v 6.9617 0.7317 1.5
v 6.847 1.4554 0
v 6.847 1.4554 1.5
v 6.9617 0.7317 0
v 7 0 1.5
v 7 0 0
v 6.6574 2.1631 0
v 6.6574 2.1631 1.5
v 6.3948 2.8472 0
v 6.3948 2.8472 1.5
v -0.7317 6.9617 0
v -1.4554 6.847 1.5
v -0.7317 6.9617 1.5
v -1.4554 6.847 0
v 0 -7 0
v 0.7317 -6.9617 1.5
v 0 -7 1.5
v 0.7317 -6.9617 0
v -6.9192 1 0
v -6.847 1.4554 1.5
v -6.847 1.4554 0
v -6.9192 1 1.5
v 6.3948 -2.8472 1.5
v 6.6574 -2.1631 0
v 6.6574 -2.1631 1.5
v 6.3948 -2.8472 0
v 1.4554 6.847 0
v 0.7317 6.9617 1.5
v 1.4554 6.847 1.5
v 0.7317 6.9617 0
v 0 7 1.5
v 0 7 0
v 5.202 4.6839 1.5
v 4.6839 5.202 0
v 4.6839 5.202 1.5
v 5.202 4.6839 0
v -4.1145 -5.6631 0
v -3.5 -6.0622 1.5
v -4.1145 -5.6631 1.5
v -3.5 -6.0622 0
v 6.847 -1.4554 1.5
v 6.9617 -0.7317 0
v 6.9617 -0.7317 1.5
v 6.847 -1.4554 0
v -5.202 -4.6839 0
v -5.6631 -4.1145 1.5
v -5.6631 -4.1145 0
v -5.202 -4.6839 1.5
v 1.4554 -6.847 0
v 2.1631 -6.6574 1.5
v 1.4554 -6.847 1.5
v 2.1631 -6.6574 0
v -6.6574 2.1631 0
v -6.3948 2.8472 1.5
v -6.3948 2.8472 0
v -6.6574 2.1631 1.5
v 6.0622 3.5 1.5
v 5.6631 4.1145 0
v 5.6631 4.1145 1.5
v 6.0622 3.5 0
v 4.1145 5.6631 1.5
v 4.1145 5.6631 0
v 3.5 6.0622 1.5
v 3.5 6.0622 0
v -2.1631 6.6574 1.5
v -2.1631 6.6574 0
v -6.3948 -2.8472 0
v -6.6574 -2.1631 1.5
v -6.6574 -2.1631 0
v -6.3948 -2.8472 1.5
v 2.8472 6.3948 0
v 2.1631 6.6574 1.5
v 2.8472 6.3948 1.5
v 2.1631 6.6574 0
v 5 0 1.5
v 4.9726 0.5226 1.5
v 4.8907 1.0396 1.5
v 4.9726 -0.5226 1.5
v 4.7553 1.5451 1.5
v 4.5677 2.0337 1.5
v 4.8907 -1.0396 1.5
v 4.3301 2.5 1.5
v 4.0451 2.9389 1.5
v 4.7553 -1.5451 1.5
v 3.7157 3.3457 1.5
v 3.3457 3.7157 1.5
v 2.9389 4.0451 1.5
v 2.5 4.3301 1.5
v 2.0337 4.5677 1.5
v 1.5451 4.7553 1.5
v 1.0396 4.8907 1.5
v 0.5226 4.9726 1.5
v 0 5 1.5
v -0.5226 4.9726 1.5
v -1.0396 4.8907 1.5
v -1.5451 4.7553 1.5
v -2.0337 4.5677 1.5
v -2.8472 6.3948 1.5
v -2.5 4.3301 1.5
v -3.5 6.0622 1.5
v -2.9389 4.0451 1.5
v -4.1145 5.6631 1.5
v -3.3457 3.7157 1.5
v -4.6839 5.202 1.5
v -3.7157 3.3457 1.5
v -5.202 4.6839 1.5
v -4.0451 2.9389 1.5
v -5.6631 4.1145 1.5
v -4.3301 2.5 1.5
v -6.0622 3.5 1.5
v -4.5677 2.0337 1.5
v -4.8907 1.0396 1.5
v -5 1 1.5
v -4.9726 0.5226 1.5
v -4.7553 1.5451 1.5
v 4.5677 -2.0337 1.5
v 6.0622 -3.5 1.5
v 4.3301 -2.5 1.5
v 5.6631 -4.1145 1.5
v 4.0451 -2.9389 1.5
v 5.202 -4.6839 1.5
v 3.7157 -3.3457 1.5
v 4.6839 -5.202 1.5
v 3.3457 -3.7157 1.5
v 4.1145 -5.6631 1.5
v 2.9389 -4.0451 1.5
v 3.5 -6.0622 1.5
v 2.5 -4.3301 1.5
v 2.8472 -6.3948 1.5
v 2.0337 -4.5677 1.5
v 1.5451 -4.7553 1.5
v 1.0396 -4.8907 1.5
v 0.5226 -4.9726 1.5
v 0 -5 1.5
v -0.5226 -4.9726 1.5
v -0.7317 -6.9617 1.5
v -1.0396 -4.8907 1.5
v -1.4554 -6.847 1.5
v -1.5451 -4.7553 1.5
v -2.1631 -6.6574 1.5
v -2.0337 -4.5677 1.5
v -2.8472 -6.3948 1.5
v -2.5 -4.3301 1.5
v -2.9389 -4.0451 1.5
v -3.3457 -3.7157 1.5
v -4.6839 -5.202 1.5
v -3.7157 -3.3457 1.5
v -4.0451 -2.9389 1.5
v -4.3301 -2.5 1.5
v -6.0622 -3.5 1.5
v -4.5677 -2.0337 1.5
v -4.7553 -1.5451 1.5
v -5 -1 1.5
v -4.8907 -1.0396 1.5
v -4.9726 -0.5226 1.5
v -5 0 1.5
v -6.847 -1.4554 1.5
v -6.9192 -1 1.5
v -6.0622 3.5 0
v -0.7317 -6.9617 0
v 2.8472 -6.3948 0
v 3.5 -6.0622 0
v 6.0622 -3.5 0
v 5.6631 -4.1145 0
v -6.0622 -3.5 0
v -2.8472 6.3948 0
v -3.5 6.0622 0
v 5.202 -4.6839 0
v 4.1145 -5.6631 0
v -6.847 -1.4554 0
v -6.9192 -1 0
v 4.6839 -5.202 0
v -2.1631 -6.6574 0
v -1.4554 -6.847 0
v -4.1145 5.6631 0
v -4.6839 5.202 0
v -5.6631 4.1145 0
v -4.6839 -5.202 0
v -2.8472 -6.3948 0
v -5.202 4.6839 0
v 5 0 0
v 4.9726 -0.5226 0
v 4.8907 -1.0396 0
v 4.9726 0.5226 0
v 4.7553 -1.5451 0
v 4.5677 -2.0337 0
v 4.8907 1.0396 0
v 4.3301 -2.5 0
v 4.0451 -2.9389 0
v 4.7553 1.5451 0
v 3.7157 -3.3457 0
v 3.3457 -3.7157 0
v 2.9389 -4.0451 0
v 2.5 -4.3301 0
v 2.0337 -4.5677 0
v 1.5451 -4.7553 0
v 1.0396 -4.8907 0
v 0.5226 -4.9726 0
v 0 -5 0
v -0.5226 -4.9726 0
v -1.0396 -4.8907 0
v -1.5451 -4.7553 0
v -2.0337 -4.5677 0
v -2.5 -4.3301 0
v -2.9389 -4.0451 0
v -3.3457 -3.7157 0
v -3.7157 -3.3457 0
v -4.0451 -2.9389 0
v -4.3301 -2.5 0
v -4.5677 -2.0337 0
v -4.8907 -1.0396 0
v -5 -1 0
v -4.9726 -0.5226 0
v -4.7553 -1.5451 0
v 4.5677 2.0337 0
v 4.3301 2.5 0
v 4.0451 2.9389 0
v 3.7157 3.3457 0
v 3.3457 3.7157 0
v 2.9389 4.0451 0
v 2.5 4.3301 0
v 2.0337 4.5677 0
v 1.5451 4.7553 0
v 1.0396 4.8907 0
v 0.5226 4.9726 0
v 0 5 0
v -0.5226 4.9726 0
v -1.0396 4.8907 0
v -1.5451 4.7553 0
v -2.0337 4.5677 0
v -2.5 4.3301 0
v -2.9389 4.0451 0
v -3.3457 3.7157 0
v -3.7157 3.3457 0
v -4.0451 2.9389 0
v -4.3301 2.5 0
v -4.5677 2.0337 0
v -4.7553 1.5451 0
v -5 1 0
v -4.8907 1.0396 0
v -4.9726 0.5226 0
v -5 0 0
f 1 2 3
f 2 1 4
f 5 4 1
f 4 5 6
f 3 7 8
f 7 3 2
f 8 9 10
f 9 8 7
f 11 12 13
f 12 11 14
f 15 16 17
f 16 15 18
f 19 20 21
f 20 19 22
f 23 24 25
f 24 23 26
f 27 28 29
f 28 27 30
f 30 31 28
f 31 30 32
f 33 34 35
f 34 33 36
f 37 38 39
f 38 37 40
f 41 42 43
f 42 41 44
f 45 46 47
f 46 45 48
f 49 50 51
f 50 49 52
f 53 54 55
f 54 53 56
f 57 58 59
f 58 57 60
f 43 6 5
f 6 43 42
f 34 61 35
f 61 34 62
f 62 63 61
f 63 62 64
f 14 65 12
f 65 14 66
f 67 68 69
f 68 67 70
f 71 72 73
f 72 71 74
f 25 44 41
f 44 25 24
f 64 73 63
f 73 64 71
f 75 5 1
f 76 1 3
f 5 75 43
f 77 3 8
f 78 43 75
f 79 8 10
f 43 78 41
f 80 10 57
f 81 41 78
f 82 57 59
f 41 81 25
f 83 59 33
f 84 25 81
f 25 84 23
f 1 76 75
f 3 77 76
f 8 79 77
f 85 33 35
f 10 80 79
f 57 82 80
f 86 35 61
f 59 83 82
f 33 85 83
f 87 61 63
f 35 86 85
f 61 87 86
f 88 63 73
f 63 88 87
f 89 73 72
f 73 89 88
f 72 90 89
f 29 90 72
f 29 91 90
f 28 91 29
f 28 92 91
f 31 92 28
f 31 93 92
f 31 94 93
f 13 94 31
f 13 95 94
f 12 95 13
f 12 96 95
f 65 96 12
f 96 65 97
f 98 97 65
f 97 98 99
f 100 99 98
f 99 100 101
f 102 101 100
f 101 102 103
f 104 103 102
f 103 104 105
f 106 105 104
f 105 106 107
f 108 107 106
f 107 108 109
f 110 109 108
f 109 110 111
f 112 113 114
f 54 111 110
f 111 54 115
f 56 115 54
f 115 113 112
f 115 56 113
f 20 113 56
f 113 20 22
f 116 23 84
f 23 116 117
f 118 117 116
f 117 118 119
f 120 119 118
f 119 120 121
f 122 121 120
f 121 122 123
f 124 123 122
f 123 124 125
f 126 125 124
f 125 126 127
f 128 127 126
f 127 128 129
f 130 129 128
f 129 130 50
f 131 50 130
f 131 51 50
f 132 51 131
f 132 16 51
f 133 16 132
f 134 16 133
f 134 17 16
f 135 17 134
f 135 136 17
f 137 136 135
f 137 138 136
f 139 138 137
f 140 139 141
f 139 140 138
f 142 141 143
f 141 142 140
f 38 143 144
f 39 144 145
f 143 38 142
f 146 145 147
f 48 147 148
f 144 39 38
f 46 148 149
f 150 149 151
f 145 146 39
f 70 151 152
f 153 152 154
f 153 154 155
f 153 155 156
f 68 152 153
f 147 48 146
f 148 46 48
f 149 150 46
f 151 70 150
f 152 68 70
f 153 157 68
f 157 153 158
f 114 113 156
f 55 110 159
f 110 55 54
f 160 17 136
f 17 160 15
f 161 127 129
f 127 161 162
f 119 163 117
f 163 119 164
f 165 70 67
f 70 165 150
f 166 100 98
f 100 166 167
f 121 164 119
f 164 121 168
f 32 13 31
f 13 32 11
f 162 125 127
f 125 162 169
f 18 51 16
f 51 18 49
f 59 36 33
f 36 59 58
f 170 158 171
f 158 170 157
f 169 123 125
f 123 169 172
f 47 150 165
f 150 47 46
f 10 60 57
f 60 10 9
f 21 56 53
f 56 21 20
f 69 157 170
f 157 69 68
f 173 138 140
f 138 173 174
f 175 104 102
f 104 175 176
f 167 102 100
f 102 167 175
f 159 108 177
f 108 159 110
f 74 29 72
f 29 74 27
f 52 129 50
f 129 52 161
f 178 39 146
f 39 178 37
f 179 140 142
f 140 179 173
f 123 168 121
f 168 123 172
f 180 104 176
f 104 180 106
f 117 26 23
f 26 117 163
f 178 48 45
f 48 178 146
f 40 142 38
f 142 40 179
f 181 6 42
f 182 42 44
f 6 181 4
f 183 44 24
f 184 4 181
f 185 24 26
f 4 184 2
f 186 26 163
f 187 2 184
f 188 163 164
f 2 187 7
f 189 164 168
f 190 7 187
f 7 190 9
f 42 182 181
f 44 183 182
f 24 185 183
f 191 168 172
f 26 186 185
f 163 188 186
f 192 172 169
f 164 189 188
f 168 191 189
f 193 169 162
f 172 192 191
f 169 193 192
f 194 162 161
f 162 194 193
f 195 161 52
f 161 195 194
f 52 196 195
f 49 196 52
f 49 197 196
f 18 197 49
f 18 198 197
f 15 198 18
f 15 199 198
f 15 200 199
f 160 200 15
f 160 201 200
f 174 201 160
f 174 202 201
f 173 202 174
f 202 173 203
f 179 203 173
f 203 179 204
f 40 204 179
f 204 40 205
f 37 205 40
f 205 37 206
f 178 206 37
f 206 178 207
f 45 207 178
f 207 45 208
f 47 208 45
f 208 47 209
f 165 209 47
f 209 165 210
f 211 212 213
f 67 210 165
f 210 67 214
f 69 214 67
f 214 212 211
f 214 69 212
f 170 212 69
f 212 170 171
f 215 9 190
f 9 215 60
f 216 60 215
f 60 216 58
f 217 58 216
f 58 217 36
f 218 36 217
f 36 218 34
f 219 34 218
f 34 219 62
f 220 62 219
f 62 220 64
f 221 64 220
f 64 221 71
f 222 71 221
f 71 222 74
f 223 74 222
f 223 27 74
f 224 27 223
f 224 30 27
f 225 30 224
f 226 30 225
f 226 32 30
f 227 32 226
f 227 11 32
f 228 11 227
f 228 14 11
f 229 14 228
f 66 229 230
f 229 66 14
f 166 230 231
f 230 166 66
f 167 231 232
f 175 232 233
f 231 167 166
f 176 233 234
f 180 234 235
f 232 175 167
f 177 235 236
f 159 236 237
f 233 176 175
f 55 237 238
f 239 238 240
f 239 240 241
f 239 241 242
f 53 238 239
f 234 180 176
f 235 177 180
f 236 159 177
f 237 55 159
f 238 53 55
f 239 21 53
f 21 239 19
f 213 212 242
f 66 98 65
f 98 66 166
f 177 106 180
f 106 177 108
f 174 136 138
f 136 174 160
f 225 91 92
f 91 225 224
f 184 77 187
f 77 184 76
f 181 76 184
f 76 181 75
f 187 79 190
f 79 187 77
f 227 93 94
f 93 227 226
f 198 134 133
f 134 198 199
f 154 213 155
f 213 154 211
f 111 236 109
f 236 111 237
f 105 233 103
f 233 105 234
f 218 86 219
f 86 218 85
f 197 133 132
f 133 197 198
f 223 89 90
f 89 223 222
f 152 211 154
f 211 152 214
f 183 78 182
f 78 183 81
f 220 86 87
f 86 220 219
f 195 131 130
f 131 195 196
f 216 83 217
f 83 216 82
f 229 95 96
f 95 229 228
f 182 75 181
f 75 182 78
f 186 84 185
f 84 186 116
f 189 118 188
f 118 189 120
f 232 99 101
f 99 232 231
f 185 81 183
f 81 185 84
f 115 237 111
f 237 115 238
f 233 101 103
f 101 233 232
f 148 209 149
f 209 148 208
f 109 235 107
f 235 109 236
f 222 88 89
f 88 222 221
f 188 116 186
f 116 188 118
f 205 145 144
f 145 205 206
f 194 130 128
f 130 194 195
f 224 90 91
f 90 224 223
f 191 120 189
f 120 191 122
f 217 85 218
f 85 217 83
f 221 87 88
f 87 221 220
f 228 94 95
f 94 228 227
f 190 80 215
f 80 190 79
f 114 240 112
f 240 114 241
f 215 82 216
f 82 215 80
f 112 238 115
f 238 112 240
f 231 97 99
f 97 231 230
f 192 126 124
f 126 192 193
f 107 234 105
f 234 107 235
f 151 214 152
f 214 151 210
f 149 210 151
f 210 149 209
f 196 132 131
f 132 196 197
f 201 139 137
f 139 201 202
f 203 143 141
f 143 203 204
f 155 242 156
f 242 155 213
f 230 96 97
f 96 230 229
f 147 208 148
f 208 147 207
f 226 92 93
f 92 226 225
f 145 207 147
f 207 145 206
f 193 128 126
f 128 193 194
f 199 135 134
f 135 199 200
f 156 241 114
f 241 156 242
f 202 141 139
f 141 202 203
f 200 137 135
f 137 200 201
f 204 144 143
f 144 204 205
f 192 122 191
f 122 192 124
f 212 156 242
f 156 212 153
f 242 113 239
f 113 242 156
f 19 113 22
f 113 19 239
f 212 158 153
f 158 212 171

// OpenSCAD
// Internal retaining ring.
$fn = 60;
eps = 0.02;
inner_d = 10;
outer_d = 14;
thickness = max(1, 1.5);
difference() { cylinder(d=outer_d,h=thickness); translate([0,0,-eps]) cylinder(d=inner_d,h=thickness+2*eps); translate([-outer_d/2-eps,-1,-eps]) cube([outer_d/2-inner_d/2+eps,2,thickness+2*eps]); }
